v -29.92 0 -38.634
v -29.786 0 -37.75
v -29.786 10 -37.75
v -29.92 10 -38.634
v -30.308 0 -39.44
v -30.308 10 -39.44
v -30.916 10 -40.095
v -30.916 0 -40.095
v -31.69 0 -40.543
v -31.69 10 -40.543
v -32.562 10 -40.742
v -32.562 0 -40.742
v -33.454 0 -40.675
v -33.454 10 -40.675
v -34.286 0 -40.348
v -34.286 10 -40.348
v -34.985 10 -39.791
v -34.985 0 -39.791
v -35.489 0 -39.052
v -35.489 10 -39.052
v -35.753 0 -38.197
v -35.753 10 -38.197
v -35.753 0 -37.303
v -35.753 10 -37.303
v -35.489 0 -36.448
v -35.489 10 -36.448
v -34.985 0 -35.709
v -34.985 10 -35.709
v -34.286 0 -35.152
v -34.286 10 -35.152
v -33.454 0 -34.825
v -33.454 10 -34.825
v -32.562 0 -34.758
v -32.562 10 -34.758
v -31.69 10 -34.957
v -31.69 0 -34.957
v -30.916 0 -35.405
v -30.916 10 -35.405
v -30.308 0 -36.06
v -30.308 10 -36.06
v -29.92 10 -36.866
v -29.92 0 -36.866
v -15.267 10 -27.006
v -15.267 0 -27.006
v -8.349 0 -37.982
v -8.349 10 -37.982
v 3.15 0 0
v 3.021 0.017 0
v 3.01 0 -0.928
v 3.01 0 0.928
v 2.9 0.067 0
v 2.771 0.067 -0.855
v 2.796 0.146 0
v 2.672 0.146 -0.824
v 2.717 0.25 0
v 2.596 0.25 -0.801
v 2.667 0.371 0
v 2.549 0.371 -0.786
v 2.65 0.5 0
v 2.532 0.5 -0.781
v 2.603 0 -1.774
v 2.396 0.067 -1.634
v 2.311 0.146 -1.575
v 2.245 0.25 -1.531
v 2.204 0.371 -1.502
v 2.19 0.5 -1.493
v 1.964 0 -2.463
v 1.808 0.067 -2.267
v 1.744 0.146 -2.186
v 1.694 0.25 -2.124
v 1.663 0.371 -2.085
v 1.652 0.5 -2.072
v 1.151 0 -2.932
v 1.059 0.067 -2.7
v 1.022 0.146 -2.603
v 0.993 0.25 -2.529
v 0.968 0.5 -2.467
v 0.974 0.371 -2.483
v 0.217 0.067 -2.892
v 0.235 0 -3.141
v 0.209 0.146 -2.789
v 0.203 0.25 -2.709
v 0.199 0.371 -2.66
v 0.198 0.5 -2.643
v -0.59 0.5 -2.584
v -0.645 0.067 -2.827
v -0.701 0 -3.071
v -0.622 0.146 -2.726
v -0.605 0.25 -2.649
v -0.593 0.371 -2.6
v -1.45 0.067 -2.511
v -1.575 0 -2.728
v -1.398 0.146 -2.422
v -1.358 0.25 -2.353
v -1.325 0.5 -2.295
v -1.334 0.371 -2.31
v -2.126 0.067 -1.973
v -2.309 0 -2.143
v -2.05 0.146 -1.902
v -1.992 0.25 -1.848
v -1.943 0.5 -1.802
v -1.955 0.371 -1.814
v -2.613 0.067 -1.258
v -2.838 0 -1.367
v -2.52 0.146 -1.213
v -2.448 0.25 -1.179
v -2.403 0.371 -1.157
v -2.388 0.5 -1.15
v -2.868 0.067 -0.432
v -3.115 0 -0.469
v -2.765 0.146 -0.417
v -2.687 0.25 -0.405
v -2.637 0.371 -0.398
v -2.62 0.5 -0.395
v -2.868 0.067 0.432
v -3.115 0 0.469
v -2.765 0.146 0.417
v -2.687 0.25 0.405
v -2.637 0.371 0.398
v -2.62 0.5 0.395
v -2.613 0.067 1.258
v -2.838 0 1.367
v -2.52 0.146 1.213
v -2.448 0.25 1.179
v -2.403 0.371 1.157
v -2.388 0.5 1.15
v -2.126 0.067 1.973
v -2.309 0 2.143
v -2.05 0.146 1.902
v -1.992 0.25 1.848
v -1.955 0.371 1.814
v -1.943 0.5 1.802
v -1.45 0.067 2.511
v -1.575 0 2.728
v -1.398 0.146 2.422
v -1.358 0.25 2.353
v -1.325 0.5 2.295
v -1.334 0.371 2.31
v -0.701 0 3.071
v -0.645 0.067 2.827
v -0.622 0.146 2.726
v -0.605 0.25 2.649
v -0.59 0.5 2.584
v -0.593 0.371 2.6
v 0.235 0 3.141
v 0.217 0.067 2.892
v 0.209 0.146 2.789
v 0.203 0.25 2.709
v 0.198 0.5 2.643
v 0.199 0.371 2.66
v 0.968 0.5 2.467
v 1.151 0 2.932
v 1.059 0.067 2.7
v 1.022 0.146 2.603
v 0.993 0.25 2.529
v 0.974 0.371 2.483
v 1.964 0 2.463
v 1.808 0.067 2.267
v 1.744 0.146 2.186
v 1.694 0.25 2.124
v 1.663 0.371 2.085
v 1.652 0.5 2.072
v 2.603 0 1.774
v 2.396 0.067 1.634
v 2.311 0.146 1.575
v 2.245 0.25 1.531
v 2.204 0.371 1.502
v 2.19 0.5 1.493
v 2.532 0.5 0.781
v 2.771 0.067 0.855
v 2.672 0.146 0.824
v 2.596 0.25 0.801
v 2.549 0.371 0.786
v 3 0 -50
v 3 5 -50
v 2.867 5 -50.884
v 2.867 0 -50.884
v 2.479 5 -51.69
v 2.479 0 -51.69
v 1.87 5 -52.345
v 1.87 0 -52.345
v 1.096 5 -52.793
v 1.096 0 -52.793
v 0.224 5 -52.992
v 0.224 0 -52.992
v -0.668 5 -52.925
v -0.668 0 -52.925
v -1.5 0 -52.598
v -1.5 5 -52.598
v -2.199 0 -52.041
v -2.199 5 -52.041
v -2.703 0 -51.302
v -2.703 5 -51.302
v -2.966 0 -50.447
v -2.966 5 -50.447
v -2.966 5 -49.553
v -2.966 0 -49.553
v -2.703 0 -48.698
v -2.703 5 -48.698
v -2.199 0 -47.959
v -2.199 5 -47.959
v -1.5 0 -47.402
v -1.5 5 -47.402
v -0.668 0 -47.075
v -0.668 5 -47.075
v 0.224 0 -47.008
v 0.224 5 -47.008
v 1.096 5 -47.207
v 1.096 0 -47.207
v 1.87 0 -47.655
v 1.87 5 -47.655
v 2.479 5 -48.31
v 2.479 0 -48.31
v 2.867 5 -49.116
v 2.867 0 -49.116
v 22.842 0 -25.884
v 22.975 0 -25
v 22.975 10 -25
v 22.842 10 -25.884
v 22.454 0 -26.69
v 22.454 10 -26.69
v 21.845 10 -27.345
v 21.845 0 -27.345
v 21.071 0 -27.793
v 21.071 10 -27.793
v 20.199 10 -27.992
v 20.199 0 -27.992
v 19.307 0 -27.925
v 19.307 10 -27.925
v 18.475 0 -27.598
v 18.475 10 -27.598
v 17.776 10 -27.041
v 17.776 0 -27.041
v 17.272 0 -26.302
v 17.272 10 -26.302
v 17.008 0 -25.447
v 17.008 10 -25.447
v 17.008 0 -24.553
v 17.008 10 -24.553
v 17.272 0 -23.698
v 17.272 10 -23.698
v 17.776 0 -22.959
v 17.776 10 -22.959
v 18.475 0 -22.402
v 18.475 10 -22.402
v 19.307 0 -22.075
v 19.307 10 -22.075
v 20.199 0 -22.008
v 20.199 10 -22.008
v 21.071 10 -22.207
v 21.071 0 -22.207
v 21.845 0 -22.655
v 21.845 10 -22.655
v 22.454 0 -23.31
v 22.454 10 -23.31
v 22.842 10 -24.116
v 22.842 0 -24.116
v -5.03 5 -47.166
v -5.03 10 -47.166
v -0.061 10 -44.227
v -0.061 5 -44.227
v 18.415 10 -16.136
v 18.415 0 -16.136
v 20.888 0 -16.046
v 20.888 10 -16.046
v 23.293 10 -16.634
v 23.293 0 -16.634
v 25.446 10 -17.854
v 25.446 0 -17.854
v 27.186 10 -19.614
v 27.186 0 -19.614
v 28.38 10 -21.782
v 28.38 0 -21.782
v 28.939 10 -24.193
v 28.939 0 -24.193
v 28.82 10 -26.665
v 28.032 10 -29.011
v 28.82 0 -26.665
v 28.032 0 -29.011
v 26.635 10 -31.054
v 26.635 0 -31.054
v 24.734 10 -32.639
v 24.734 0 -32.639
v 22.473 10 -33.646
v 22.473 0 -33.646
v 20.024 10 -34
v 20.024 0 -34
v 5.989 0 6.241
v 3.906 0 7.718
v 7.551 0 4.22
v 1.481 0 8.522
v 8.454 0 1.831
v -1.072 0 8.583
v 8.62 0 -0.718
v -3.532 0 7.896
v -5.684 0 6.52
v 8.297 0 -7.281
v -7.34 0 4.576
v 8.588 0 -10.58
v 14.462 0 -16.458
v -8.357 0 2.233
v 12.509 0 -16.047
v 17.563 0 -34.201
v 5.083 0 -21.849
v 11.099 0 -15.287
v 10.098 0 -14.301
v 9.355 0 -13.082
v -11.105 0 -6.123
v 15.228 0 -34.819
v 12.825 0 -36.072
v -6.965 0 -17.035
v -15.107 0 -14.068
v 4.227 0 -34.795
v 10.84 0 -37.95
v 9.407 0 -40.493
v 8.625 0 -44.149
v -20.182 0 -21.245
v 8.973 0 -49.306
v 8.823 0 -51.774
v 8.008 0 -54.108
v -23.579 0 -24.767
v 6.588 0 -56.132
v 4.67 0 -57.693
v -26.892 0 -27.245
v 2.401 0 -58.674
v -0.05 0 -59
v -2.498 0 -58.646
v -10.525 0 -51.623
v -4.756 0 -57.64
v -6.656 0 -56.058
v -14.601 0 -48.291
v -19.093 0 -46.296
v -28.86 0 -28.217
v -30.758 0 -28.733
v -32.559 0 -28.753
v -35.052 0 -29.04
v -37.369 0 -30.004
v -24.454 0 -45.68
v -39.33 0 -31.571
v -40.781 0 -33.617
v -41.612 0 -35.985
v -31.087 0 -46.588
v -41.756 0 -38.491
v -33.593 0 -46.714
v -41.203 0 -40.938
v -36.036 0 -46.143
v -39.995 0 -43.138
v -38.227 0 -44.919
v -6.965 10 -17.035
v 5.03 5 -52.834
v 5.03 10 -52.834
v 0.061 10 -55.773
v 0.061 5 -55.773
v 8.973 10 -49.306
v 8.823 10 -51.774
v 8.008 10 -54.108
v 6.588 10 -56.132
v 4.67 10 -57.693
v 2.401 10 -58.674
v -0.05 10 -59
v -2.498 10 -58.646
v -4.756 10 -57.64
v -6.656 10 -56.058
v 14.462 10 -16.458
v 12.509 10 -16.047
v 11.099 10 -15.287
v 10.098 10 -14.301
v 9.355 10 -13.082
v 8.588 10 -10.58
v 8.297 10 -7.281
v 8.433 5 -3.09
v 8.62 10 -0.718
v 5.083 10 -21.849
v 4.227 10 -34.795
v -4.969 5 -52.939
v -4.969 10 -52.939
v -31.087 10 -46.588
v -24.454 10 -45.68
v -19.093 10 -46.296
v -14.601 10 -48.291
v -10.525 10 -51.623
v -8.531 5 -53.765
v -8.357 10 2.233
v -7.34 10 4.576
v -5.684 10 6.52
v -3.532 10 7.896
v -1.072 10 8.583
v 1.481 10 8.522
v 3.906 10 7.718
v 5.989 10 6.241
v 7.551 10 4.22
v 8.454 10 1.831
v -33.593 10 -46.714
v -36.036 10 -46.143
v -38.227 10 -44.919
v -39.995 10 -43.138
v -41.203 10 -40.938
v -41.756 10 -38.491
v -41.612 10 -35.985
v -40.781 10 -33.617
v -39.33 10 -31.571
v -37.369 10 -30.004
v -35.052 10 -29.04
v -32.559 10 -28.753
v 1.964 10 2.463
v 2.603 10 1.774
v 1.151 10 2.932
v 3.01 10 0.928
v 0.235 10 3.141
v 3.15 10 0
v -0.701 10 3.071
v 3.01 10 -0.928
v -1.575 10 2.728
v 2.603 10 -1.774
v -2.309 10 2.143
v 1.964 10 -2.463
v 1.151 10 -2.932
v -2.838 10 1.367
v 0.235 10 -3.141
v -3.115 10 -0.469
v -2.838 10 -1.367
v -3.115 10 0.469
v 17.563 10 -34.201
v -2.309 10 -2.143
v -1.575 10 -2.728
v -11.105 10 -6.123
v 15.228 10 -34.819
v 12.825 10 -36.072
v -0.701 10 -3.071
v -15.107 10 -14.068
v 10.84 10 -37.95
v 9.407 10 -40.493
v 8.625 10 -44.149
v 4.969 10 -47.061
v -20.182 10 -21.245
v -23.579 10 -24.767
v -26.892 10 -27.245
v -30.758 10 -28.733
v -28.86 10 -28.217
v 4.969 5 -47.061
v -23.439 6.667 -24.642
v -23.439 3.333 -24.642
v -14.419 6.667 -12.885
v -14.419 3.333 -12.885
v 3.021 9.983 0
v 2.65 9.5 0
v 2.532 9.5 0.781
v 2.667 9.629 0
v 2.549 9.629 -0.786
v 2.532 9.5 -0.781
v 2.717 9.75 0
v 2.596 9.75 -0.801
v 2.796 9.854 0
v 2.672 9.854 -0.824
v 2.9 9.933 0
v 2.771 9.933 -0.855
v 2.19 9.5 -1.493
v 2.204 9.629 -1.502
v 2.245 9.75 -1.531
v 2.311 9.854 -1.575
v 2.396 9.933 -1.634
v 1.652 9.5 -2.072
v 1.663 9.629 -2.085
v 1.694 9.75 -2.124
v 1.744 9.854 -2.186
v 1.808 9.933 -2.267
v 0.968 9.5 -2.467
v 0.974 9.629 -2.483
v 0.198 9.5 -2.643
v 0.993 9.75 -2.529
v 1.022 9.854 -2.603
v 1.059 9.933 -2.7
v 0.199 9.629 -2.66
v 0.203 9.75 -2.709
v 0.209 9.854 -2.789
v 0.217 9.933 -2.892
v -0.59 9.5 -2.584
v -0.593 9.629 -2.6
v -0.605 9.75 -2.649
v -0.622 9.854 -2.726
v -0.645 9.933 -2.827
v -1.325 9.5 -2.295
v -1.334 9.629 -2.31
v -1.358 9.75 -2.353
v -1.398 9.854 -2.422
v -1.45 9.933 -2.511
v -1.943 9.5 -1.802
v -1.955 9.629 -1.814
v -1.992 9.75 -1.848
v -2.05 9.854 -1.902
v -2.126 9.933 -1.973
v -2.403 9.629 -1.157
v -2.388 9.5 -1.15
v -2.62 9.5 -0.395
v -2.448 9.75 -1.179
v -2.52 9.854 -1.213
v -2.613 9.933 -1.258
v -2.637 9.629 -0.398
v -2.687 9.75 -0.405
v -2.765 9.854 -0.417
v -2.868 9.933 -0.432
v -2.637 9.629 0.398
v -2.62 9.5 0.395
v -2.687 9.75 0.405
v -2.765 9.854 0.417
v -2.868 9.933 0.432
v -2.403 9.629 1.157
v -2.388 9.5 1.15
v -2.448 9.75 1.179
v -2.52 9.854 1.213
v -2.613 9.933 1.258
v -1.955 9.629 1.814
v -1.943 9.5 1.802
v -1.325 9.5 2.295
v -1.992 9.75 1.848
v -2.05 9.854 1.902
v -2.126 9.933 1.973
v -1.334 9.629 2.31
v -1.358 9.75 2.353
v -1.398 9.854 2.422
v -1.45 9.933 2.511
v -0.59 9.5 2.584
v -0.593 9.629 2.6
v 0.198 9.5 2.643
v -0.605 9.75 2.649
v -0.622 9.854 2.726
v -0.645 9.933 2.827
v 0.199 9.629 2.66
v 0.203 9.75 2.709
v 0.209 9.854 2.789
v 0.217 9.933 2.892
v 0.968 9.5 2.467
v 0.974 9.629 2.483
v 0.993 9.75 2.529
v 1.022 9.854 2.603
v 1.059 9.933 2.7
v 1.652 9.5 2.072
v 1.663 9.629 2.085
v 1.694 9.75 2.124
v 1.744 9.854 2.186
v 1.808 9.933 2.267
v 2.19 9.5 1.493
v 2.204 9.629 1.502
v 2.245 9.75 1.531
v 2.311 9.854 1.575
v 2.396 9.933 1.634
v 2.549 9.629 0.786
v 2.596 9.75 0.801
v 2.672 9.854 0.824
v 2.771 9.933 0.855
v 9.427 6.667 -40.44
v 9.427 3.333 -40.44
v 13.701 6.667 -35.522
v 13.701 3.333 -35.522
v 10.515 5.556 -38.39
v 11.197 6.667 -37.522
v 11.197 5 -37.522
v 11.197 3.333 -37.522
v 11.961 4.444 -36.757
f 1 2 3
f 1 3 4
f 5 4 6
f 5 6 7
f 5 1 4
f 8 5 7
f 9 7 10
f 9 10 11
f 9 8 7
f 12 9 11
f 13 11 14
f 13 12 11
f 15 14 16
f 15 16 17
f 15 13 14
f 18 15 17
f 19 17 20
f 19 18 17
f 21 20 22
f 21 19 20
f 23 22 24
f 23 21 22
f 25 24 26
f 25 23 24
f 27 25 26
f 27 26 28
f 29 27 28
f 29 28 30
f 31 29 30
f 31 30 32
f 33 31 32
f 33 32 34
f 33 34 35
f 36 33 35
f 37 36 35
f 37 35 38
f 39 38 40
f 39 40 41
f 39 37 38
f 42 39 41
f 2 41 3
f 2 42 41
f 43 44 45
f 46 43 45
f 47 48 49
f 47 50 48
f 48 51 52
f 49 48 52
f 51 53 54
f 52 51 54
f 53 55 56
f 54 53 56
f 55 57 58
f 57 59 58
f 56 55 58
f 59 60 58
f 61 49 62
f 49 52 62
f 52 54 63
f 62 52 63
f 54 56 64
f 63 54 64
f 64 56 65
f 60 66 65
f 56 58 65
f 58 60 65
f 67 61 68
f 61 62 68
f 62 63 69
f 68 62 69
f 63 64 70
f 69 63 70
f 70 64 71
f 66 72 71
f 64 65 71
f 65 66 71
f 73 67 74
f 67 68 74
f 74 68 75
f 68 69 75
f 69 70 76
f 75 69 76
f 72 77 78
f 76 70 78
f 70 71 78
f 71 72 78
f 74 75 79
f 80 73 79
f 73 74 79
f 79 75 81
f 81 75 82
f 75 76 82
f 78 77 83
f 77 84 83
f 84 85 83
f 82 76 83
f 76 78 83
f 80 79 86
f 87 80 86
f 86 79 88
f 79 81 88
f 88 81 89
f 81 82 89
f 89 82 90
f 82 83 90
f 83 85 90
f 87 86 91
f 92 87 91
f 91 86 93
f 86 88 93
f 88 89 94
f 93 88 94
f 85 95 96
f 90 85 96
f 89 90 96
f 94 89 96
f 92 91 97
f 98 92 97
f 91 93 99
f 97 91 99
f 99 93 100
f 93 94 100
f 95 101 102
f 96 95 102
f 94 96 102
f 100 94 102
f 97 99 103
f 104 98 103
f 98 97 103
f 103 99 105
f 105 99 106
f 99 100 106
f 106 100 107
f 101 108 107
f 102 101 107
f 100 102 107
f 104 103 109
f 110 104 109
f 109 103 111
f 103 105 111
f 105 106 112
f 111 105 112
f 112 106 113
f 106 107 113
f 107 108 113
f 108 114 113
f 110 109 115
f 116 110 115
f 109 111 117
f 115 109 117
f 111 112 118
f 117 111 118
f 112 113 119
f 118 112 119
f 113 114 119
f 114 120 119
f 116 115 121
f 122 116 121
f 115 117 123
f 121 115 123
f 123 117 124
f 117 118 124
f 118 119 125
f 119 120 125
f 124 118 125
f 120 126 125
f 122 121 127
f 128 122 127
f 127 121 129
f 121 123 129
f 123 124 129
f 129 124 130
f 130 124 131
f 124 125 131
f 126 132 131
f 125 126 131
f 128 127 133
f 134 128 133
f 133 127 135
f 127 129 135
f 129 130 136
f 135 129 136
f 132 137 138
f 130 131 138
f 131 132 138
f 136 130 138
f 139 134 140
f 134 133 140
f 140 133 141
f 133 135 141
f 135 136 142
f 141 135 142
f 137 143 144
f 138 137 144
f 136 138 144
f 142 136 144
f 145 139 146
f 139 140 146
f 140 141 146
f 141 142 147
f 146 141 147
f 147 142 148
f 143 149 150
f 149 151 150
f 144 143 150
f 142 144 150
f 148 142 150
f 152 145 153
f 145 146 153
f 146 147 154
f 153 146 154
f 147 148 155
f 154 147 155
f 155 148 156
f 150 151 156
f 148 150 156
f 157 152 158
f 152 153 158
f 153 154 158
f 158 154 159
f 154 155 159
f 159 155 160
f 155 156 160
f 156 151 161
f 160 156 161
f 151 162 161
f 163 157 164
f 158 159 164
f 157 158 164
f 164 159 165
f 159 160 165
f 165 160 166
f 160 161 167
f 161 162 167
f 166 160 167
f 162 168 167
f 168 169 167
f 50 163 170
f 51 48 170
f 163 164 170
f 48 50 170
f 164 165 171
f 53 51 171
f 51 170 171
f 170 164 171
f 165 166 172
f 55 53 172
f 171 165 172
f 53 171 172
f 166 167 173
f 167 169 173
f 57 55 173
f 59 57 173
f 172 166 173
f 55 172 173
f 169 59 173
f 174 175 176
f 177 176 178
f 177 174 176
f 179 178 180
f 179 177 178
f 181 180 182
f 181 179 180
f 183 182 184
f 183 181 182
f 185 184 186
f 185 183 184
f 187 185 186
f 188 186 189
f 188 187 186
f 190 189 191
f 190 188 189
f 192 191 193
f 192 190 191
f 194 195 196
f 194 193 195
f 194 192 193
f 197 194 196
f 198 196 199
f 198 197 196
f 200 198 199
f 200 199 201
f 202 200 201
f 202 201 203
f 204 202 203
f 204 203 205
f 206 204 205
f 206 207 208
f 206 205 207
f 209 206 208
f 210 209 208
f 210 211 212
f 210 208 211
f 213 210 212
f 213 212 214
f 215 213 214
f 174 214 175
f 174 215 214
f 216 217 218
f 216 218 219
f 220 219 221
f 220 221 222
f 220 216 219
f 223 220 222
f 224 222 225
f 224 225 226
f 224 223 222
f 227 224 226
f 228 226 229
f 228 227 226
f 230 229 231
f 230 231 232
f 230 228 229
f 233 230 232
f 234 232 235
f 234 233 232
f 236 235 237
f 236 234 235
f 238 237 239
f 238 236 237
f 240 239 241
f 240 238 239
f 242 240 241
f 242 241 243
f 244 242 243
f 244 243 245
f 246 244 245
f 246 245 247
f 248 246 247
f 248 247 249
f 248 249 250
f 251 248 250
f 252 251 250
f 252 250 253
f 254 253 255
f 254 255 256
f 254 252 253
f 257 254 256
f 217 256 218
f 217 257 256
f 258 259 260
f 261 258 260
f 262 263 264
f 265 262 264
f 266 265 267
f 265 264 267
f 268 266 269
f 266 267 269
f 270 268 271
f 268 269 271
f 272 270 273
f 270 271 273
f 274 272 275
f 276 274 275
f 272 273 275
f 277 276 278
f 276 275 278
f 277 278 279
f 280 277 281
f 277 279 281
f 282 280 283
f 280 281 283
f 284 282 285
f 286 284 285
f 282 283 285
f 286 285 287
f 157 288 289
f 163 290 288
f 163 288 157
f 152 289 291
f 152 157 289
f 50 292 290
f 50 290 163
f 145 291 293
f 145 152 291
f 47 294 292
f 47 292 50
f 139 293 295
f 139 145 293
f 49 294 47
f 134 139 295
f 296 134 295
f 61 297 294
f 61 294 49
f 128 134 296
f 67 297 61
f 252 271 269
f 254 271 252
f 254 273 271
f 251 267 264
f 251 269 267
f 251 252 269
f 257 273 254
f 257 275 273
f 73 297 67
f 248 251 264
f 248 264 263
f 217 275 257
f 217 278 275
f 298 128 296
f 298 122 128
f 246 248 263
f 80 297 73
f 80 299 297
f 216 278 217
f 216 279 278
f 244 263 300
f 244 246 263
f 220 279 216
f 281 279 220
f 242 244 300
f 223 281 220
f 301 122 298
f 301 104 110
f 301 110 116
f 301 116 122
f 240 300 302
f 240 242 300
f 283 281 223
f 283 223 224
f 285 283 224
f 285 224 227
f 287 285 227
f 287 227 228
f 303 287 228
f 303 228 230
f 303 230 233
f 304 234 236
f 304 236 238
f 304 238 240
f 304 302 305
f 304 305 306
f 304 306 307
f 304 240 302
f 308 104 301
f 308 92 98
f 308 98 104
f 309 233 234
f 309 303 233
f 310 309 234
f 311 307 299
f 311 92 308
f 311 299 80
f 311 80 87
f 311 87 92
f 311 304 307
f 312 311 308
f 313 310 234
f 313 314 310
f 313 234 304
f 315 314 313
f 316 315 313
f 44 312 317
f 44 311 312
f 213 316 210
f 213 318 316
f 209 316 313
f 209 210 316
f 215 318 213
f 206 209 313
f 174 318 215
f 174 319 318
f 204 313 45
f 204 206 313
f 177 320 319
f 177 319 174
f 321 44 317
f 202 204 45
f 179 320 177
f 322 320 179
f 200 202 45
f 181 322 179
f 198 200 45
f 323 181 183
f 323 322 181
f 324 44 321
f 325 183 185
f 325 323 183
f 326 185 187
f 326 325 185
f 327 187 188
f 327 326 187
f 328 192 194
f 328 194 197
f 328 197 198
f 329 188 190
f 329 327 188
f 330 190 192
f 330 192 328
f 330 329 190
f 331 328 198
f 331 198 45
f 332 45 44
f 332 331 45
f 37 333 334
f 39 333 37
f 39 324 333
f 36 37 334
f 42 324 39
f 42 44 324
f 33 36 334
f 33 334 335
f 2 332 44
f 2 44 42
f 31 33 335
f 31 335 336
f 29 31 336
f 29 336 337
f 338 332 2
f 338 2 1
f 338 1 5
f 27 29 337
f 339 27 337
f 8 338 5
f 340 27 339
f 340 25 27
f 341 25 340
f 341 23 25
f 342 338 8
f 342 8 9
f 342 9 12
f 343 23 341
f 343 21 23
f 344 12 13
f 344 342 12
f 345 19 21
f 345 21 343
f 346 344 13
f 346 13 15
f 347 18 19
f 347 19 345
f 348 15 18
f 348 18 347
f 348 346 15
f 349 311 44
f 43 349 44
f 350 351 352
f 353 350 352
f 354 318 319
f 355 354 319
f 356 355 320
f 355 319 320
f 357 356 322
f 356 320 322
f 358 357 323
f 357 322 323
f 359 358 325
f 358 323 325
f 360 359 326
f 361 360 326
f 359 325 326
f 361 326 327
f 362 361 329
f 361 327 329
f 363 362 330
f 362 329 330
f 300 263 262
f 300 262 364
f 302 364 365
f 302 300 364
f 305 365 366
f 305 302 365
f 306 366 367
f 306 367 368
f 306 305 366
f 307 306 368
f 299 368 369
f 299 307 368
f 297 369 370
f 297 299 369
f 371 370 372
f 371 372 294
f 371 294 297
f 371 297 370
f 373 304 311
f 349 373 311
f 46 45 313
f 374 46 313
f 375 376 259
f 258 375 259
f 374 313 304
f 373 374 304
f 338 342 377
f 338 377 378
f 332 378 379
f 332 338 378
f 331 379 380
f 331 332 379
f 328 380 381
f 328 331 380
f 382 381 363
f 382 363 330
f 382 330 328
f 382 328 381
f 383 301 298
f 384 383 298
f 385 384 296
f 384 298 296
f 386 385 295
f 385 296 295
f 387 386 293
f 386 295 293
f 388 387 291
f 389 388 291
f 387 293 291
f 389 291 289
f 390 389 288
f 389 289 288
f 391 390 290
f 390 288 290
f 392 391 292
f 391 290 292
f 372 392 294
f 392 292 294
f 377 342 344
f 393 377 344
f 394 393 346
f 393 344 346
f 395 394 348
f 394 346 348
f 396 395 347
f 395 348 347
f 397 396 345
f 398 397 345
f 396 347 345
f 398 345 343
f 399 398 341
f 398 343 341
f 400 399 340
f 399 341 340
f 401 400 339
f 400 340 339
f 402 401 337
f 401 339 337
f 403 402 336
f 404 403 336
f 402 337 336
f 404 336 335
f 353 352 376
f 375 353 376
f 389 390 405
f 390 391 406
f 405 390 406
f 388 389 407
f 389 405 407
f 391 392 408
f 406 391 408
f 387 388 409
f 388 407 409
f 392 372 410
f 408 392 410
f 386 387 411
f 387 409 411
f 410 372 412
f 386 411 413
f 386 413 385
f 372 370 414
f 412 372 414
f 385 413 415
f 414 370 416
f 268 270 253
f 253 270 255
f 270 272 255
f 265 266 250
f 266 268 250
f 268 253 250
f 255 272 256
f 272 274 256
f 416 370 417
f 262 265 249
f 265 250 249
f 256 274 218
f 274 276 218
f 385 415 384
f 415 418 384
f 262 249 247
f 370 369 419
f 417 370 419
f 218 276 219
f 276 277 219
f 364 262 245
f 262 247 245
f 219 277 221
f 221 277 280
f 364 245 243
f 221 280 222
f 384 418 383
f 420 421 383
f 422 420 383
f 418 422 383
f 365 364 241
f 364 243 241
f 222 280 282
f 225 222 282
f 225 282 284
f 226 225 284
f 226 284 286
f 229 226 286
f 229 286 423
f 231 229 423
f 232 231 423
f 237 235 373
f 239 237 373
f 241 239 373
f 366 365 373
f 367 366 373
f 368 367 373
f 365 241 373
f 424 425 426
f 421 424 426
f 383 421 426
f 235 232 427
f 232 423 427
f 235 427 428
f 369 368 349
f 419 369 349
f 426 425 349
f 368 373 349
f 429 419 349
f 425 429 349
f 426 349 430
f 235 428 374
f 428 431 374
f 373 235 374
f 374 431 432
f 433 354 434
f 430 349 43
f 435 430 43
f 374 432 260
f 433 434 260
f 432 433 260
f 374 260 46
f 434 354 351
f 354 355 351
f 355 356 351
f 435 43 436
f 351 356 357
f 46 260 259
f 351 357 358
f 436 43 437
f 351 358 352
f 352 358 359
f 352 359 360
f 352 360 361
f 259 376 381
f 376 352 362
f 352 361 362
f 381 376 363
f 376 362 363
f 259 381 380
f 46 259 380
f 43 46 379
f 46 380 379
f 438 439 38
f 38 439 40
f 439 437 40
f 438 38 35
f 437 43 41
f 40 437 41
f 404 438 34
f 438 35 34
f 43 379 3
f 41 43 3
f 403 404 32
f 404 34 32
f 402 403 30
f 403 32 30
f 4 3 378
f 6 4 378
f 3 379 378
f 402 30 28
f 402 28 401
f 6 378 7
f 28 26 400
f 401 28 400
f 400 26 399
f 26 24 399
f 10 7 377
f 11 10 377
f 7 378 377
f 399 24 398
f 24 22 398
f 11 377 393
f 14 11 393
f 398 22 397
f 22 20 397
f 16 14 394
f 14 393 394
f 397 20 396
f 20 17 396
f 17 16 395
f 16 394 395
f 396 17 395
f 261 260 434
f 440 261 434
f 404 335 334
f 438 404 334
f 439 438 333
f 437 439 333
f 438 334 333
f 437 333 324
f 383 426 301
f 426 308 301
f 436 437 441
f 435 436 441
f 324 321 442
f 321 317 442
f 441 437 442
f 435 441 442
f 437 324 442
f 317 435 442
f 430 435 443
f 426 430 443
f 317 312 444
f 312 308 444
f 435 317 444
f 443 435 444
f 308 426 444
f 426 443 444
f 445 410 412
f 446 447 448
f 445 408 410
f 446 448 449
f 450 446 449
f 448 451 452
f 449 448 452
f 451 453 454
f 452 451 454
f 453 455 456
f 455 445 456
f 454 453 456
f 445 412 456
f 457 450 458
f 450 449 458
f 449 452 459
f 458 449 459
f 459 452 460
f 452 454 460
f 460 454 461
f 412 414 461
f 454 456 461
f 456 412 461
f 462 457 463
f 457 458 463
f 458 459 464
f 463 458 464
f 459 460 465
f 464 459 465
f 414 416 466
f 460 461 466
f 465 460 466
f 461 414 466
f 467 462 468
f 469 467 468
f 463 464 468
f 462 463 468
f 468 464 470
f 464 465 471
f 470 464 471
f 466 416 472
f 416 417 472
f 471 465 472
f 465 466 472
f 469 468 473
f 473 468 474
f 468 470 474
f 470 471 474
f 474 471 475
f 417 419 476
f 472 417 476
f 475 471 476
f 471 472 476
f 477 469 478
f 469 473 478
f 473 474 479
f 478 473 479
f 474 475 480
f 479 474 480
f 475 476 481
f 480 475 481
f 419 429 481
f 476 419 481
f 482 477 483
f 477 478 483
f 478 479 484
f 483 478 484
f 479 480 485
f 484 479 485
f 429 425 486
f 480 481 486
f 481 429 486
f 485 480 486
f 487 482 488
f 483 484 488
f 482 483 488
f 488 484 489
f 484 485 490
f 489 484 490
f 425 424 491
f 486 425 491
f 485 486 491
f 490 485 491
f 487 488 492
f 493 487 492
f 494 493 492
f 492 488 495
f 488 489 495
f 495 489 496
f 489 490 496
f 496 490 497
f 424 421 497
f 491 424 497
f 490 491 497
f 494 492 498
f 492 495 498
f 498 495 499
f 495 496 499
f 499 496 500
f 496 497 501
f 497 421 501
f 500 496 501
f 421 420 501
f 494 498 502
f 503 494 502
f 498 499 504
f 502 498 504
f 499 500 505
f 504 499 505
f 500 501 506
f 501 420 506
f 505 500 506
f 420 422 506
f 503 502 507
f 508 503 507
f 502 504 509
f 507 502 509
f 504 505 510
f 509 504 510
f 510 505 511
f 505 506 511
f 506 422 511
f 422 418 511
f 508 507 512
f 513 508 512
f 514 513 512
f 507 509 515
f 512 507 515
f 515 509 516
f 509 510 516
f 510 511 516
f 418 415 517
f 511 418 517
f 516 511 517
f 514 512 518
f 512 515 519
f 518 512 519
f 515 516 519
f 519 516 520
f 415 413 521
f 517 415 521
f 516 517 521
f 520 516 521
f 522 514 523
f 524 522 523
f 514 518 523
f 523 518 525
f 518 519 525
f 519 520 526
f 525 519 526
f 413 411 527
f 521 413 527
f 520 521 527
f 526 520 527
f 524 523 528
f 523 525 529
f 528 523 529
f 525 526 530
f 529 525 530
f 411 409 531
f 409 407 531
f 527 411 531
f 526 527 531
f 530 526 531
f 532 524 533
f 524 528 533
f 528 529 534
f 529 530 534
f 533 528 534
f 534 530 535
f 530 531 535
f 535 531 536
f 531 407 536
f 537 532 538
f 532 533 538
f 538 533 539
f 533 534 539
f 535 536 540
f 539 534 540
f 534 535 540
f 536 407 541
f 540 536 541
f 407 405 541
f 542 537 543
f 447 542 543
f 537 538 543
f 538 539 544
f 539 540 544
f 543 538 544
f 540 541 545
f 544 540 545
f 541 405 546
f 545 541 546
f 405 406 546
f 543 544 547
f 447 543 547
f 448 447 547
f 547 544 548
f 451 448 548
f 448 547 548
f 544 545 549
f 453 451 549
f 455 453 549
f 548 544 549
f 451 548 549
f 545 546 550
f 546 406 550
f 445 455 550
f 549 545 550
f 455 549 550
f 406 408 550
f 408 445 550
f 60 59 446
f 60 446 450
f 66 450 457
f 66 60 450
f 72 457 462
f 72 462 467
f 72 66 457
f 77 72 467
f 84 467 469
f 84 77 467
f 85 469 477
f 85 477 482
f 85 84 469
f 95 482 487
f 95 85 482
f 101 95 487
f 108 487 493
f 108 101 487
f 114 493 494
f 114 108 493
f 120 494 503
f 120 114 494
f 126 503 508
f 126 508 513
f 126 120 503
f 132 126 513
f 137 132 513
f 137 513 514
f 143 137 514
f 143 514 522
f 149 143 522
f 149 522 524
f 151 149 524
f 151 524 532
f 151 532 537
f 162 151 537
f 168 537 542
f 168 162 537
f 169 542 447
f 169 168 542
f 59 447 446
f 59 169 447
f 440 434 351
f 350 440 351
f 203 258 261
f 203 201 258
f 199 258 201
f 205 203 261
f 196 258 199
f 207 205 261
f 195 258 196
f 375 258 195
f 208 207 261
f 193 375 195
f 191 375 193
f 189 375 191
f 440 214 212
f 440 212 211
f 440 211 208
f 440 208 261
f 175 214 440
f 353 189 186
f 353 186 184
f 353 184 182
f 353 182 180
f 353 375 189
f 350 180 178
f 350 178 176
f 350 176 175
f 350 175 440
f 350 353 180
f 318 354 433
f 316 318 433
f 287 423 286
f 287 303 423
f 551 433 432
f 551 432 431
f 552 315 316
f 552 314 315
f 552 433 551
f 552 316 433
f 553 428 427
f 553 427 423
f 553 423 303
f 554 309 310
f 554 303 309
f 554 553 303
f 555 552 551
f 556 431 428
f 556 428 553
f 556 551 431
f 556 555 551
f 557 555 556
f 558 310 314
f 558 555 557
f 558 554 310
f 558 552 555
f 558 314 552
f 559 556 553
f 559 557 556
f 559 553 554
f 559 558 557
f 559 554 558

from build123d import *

# Parameters (mm, degrees)
EXTRUDE_1_OUTLINE_R   = 2.65
EXTRUDE_1_OUTLINE_R_2 = 3
EXTRUDE_1_DEPTH       = 10
CUT_EXTRUDE_1_DEPTH   = 5
FILLET_2_R            = 0.5
FILLET_3_R            = 0.5


# Read off the part's stored shape, not the designer's step: Бобышка-Вытянуть1
with BuildPart() as part:
    # Бобышка-Вытянуть1 outline → Бобышка-Вытянуть1 (new body)
    with BuildSketch(Plane(origin=(0, 0, 0), x_dir=(1, 0, 0), z_dir=(0, 1, 0))):
        with BuildLine():
            add(Edge.make_bspline(
                [(18.415201064, 16.136192912), (8.099804211, 18.278215903), (7.946140725, 9.450828153), (8.545020219, 1.48873653), (8.620156017, 0.717920777)],
                knots=[0, 0, 0, 0, 0.640184332, 0.711315924, 0.711315924, 0.711315924, 0.711315924], degree=3))
            ThreePointArc((18.415201064, 16.136192912), (28.93870742, 24.192739926), (20.02397796, 33.999866645))
            add(Edge.make_bspline(
                [(8.973177852, 49.305680737), (6.927050039, 38.283305713), (13.265956439, 34.007939827), (20.02397796, 33.999866645)],
                knots=[0, 0, 0, 0, 0.587985905, 0.587985905, 0.587985905, 0.587985905], degree=3))
            ThreePointArc((8.973177852, 49.305680737), (3.569296499, 58.26196844), (-6.656088527, 56.057762419))
            add(Edge.make_bspline(
                [(-31.086724645, 46.588079502), (-19.789574651, 43.949152129), (-13.613870041, 47.607425407), (-7.2630146, 55.254087082), (-6.656088527, 56.057762419)],
                knots=[0, 0, 0, 0, 0.709310605, 0.788122895, 0.788122895, 0.788122895, 0.788122895], degree=3))
            ThreePointArc((-31.086724645, 46.588079502), (-41.755710839, 38.490664399), (-32.559488638, 28.752856895))
            add(Edge.make_bspline(
                [(-32.559488638, 28.752856895), (-24.340075334, 29.891987935), (-11.988968241, 13.137863403), (-8.356742025, -2.233240408)],
                knots=[0, 0, 0, 0, 0.797106576, 0.797106576, 0.797106576, 0.797106576], degree=3))
            ThreePointArc((-8.356742025, -2.233240408), (1.481446867, -8.522195444), (8.620156017, 0.717920777))
        make_face()
        Circle(EXTRUDE_1_OUTLINE_R, mode=Mode.SUBTRACT)
        with Locations((19.974984355, 25)):
            Circle(EXTRUDE_1_OUTLINE_R_2, mode=Mode.SUBTRACT)
        with Locations((-32.786239492, 37.75)):
            Circle(EXTRUDE_1_OUTLINE_R_2, mode=Mode.SUBTRACT)
        Polygon((-8.349392166, 37.982099134), (4.227404243, 34.795225893), (5.082951506, 21.849183724), (-6.965087616, 17.034962885), (-15.266732554, 27.005652946), align=None, mode=Mode.SUBTRACT)
        with Locations((0, 50)):
            Circle(EXTRUDE_1_OUTLINE_R_2, mode=Mode.SUBTRACT)
    extrude(amount=EXTRUDE_1_DEPTH)

    # Эскиз2 → Вырез-Вытянуть1 (cut)
    with BuildSketch(Plane(origin=(0, 10, 0), x_dir=(1, 0, 0), z_dir=(0, 1, 0))):
        Polygon((5.030262391, 52.833689046), (0.061084495, 55.773179541), (-4.969177896, 52.939490495), (-5.030262391, 47.166310954), (-0.061084495, 44.226820459), (4.969177896, 47.060509505), align=None)
    extrude(amount=-CUT_EXTRUDE_1_DEPTH, mode=Mode.SUBTRACT)

    # Скругление2
    fillet_2_edges = [part.edges().sort_by_distance(p)[0] for p in [
        (-2.65, 0, 0),
    ]]
    fillet(fillet_2_edges, radius=FILLET_2_R)

    # Скругление3
    fillet_3_edges = [part.edges().sort_by_distance(p)[0] for p in [
        (-2.65, 10, 0),
    ]]
    fillet(fillet_3_edges, radius=FILLET_3_R)


solid = part.part
